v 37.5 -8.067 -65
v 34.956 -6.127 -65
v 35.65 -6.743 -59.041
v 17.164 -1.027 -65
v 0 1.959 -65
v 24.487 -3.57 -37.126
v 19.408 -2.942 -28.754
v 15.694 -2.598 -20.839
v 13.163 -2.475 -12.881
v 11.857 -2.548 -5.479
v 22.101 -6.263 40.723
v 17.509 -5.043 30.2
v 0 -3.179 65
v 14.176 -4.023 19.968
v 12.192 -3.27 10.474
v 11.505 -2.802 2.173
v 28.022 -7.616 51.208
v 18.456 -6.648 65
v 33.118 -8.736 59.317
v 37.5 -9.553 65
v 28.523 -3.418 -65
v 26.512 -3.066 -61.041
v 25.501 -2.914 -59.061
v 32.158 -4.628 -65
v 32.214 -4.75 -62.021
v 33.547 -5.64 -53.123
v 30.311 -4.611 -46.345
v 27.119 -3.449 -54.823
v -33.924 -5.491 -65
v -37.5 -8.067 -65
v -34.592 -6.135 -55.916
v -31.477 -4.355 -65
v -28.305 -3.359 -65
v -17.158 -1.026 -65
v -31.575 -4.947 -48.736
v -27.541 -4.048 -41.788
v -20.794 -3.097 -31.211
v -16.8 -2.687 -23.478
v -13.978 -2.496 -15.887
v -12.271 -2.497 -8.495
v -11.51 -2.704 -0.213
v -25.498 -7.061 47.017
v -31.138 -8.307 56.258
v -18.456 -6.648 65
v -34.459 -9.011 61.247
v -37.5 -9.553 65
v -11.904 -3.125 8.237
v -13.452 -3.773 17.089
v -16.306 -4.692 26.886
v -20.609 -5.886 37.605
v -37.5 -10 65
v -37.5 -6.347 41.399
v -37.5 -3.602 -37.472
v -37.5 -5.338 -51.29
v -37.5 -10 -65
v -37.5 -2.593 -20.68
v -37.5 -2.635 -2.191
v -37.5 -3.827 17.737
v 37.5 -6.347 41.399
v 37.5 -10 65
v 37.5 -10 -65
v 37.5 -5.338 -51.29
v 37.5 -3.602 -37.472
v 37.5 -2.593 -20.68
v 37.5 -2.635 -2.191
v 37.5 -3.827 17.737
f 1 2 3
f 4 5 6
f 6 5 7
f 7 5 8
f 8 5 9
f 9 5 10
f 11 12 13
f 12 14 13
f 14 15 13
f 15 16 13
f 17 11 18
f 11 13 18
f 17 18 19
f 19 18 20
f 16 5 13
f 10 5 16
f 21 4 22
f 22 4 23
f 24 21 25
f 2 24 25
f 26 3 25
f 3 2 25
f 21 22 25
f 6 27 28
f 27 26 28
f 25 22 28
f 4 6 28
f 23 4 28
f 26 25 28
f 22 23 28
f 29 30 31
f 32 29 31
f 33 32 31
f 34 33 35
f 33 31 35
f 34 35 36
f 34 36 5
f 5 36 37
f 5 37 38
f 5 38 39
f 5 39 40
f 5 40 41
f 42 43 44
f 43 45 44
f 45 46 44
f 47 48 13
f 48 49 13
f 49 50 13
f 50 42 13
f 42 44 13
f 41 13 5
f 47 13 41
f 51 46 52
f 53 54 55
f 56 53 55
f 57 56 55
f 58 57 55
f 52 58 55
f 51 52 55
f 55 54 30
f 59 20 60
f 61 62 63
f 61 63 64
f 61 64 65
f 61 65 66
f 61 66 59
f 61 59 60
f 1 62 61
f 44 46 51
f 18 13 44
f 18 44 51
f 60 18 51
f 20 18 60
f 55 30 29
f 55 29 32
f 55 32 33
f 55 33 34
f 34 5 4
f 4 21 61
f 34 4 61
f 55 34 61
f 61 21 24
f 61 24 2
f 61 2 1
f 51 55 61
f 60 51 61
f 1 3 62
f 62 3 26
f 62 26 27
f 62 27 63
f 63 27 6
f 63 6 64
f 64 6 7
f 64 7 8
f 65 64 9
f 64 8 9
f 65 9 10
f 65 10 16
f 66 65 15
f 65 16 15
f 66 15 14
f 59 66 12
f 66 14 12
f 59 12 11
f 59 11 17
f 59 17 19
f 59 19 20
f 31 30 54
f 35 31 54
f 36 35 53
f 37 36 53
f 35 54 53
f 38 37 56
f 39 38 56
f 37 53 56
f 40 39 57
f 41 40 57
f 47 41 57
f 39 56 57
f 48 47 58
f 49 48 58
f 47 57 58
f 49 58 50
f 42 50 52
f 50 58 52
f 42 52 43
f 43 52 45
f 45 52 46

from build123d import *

# Parameters (mm, degrees)
SKETCH1_W           = 75
SKETCH1_H           = 130
BOSS_EXTRUDE1_DEPTH = 10


with BuildPart() as part:
    # Sketch1 → Boss-Extrude1 (new, symmetric)
    with BuildSketch(Plane(origin=(0, 0, 0), x_dir=(1, 0, 0), z_dir=(0, 1, 0))):
        Rectangle(SKETCH1_W, SKETCH1_H)
    extrude(amount=BOSS_EXTRUDE1_DEPTH, both=True)

    # Sketch18 → Cut-Loft2 section 0
    with BuildSketch(Plane(origin=(0, 0, -65), x_dir=(-1, 0, 0), z_dir=(0, 0, -1))):
        with BuildLine():
            Line((-37.5, -8.067205879), (-37.5, 10))
            Line((-37.5, 10), (37.5, 10))
            Line((37.5, 10), (37.5, -8.067205879))
            add(Edge.make_bspline(
                [(37.5, -8.067205879), (36.868354158, -7.545723818), (36.232515665, -7.031356123), (34.9150412, -6.080332922), (34.231976939, -5.64610103), (32.799590286, -4.890068418), (32.051510087, -4.566159862), (30.894312176, -4.139819038), (30.50255078, -4.007063364), (29.718003297, -3.757880572), (29.324173778, -3.641189654), (28.139305681, -3.308278708), (27.345030939, -3.108492419), (25.751942464, -2.731969529), (24.953040234, -2.555682332), (22.552383626, -2.046879016), (20.946741679, -1.73410457), (16.124007748, -0.825275602), (12.901013123, -0.259195592), (6.452423939, 0.859761572), (3.226270152, 1.409798881), (0, 1.959245267)],
                knots=[0, 0, 0, 0, 0.0625, 0.0625, 0.125, 0.125, 0.1875, 0.1875, 0.21875, 0.21875, 0.25, 0.25, 0.3125, 0.3125, 0.375, 0.375, 0.5, 0.5, 0.75, 0.75, 1, 1, 1, 1], degree=3))
            add(Edge.make_bspline(
                [(0, 1.959245267), (-3.220307336, 1.410814372), (-6.440507139, 0.86179111), (-12.877490243, -0.255075859), (-16.09478496, -0.820102332), (-20.909950392, -1.727007192), (-22.513230185, -2.03908866), (-24.911012133, -2.546530452), (-25.709493997, -2.722427014), (-27.298060456, -3.096927844), (-28.088557635, -3.29521287), (-29.655363733, -3.733135251), (-30.431632803, -3.972888742), (-31.958036808, -4.528564833), (-32.707328207, -4.846945958), (-33.799969506, -5.415730657), (-34.159815247, -5.621350704), (-34.864751883, -6.060575044), (-35.207986102, -6.292686311), (-36.216294341, -7.017979177), (-36.860577231, -7.539303245), (-37.5, -8.067205879)],
                knots=[0, 0, 0, 0, 0.25, 0.25, 0.5, 0.5, 0.625, 0.625, 0.6875, 0.6875, 0.75, 0.75, 0.8125, 0.8125, 0.875, 0.875, 0.90625, 0.90625, 0.9375, 0.9375, 1, 1, 1, 1], degree=3))
        make_face()
    # Sketch19 → Cut-Loft2 section 1
    with BuildSketch(Plane.XY.offset(65)):
        with BuildLine():
            Line((-37.5, -9.55282328), (-37.5, 10))
            Line((-37.5, 10), (37.5, 10))
            Line((37.5, 10), (37.5, -9.55282328))
            add(Edge.make_bspline(
                [(37.5, -9.55282328), (35.932013067, -9.320012995), (34.36408728, -9.086801305), (31.231041127, -8.601961383), (29.664529784, -8.359464397), (26.527308392, -7.902033368), (24.957345427, -7.682195005), (21.822950757, -7.206207592), (20.258104881, -6.952769992), (15.568704339, -6.158778808), (12.449953925, -5.589410309), (6.219567493, -4.412774878), (3.108245531, -3.803834972), (0, -3.178506899)],
                knots=[0, 0, 0, 0, 0.125, 0.125, 0.25, 0.25, 0.375, 0.375, 0.5, 0.5, 0.75, 0.75, 1, 1, 1, 1], degree=3))
            add(Edge.make_bspline(
                [(0, -3.178506899), (-3.10824669, -3.803835204), (-6.21957007, -4.412775385), (-12.449959995, -5.589411435), (-15.568715473, -6.158780795), (-20.258115527, -6.952771743), (-21.822959191, -7.206208919), (-24.957352089, -7.68219597), (-26.527314428, -7.902034226), (-29.664534297, -8.359465077), (-31.231044679, -8.601961938), (-34.364088921, -9.086801553), (-35.932013884, -9.320013117), (-37.5, -9.55282328)],
                knots=[0, 0, 0, 0, 0.25, 0.25, 0.5, 0.5, 0.625, 0.625, 0.75, 0.75, 0.875, 0.875, 1, 1, 1, 1], degree=3))
        make_face()
    loft(mode=Mode.SUBTRACT)

    # Sketch22 → Loft1 section 0
    with BuildSketch(Plane(origin=(37.5, 0, 0), x_dir=(0, 0, -1), z_dir=(1, 0, 0))):
        with BuildLine():
            Line((-65, -9.55282328), (-65, -10))
            Line((-65, -10), (65, -10))
            Line((65, -10), (65, -8.067205879))
            add(Edge.make_bspline(
                [(65, -8.067205879), (59.66858748, -6.779803174), (54.307105316, -5.768751628), (43.536931445, -4.180521721), (38.128214021, -3.603579704), (27.272426373, -2.802172102), (21.82546577, -2.576699058), (13.630427287, -2.464550347), (10.894685054, -2.46523815), (5.434548965, -2.537160266), (2.707640474, -2.608230068), (-5.464184608, -2.920340072), (-10.899890277, -3.263731439), (-21.75289667, -4.155028741), (-27.170549339, -4.699023884), (-37.99465892, -5.911420694), (-43.400914096, -6.582064044), (-54.205711181, -8.009060079), (-59.604185655, -8.766162086), (-65, -9.55282328)],
                knots=[0, 0, 0, 0, 0.125, 0.125, 0.25, 0.25, 0.375, 0.375, 0.4375, 0.4375, 0.5, 0.5, 0.625, 0.625, 0.75, 0.75, 0.875, 0.875, 1, 1, 1, 1], degree=3))
        make_face()
    # Sketch21 → Loft1 section 1
    with BuildSketch(Plane.ZY.offset(37.5)):
        with BuildLine():
            Line((-65, -8.067205879), (-65, -10))
            Line((-65, -10), (65, -10))
            Line((65, -10), (65, -9.55282328))
            add(Edge.make_bspline(
                [(-65, -8.067205879), (-59.66858748, -6.779803174), (-54.307105316, -5.768751628), (-43.536931445, -4.180521721), (-38.128214021, -3.603579704), (-27.272426373, -2.802172102), (-21.82546577, -2.576699058), (-13.630427287, -2.464550347), (-10.894685054, -2.46523815), (-5.434548965, -2.537160266), (-2.707640474, -2.608230068), (5.464184608, -2.920340072), (10.899890277, -3.263731439), (21.75289667, -4.155028741), (27.170549339, -4.699023884), (37.99465892, -5.911420694), (43.400914096, -6.582064044), (54.205711181, -8.009060079), (59.604185655, -8.766162086), (65, -9.55282328)],
                knots=[0, 0, 0, 0, 0.125, 0.125, 0.25, 0.25, 0.375, 0.375, 0.4375, 0.4375, 0.5, 0.5, 0.625, 0.625, 0.75, 0.75, 0.875, 0.875, 1, 1, 1, 1], degree=3))
        make_face()
    loft()


solid = part.part
